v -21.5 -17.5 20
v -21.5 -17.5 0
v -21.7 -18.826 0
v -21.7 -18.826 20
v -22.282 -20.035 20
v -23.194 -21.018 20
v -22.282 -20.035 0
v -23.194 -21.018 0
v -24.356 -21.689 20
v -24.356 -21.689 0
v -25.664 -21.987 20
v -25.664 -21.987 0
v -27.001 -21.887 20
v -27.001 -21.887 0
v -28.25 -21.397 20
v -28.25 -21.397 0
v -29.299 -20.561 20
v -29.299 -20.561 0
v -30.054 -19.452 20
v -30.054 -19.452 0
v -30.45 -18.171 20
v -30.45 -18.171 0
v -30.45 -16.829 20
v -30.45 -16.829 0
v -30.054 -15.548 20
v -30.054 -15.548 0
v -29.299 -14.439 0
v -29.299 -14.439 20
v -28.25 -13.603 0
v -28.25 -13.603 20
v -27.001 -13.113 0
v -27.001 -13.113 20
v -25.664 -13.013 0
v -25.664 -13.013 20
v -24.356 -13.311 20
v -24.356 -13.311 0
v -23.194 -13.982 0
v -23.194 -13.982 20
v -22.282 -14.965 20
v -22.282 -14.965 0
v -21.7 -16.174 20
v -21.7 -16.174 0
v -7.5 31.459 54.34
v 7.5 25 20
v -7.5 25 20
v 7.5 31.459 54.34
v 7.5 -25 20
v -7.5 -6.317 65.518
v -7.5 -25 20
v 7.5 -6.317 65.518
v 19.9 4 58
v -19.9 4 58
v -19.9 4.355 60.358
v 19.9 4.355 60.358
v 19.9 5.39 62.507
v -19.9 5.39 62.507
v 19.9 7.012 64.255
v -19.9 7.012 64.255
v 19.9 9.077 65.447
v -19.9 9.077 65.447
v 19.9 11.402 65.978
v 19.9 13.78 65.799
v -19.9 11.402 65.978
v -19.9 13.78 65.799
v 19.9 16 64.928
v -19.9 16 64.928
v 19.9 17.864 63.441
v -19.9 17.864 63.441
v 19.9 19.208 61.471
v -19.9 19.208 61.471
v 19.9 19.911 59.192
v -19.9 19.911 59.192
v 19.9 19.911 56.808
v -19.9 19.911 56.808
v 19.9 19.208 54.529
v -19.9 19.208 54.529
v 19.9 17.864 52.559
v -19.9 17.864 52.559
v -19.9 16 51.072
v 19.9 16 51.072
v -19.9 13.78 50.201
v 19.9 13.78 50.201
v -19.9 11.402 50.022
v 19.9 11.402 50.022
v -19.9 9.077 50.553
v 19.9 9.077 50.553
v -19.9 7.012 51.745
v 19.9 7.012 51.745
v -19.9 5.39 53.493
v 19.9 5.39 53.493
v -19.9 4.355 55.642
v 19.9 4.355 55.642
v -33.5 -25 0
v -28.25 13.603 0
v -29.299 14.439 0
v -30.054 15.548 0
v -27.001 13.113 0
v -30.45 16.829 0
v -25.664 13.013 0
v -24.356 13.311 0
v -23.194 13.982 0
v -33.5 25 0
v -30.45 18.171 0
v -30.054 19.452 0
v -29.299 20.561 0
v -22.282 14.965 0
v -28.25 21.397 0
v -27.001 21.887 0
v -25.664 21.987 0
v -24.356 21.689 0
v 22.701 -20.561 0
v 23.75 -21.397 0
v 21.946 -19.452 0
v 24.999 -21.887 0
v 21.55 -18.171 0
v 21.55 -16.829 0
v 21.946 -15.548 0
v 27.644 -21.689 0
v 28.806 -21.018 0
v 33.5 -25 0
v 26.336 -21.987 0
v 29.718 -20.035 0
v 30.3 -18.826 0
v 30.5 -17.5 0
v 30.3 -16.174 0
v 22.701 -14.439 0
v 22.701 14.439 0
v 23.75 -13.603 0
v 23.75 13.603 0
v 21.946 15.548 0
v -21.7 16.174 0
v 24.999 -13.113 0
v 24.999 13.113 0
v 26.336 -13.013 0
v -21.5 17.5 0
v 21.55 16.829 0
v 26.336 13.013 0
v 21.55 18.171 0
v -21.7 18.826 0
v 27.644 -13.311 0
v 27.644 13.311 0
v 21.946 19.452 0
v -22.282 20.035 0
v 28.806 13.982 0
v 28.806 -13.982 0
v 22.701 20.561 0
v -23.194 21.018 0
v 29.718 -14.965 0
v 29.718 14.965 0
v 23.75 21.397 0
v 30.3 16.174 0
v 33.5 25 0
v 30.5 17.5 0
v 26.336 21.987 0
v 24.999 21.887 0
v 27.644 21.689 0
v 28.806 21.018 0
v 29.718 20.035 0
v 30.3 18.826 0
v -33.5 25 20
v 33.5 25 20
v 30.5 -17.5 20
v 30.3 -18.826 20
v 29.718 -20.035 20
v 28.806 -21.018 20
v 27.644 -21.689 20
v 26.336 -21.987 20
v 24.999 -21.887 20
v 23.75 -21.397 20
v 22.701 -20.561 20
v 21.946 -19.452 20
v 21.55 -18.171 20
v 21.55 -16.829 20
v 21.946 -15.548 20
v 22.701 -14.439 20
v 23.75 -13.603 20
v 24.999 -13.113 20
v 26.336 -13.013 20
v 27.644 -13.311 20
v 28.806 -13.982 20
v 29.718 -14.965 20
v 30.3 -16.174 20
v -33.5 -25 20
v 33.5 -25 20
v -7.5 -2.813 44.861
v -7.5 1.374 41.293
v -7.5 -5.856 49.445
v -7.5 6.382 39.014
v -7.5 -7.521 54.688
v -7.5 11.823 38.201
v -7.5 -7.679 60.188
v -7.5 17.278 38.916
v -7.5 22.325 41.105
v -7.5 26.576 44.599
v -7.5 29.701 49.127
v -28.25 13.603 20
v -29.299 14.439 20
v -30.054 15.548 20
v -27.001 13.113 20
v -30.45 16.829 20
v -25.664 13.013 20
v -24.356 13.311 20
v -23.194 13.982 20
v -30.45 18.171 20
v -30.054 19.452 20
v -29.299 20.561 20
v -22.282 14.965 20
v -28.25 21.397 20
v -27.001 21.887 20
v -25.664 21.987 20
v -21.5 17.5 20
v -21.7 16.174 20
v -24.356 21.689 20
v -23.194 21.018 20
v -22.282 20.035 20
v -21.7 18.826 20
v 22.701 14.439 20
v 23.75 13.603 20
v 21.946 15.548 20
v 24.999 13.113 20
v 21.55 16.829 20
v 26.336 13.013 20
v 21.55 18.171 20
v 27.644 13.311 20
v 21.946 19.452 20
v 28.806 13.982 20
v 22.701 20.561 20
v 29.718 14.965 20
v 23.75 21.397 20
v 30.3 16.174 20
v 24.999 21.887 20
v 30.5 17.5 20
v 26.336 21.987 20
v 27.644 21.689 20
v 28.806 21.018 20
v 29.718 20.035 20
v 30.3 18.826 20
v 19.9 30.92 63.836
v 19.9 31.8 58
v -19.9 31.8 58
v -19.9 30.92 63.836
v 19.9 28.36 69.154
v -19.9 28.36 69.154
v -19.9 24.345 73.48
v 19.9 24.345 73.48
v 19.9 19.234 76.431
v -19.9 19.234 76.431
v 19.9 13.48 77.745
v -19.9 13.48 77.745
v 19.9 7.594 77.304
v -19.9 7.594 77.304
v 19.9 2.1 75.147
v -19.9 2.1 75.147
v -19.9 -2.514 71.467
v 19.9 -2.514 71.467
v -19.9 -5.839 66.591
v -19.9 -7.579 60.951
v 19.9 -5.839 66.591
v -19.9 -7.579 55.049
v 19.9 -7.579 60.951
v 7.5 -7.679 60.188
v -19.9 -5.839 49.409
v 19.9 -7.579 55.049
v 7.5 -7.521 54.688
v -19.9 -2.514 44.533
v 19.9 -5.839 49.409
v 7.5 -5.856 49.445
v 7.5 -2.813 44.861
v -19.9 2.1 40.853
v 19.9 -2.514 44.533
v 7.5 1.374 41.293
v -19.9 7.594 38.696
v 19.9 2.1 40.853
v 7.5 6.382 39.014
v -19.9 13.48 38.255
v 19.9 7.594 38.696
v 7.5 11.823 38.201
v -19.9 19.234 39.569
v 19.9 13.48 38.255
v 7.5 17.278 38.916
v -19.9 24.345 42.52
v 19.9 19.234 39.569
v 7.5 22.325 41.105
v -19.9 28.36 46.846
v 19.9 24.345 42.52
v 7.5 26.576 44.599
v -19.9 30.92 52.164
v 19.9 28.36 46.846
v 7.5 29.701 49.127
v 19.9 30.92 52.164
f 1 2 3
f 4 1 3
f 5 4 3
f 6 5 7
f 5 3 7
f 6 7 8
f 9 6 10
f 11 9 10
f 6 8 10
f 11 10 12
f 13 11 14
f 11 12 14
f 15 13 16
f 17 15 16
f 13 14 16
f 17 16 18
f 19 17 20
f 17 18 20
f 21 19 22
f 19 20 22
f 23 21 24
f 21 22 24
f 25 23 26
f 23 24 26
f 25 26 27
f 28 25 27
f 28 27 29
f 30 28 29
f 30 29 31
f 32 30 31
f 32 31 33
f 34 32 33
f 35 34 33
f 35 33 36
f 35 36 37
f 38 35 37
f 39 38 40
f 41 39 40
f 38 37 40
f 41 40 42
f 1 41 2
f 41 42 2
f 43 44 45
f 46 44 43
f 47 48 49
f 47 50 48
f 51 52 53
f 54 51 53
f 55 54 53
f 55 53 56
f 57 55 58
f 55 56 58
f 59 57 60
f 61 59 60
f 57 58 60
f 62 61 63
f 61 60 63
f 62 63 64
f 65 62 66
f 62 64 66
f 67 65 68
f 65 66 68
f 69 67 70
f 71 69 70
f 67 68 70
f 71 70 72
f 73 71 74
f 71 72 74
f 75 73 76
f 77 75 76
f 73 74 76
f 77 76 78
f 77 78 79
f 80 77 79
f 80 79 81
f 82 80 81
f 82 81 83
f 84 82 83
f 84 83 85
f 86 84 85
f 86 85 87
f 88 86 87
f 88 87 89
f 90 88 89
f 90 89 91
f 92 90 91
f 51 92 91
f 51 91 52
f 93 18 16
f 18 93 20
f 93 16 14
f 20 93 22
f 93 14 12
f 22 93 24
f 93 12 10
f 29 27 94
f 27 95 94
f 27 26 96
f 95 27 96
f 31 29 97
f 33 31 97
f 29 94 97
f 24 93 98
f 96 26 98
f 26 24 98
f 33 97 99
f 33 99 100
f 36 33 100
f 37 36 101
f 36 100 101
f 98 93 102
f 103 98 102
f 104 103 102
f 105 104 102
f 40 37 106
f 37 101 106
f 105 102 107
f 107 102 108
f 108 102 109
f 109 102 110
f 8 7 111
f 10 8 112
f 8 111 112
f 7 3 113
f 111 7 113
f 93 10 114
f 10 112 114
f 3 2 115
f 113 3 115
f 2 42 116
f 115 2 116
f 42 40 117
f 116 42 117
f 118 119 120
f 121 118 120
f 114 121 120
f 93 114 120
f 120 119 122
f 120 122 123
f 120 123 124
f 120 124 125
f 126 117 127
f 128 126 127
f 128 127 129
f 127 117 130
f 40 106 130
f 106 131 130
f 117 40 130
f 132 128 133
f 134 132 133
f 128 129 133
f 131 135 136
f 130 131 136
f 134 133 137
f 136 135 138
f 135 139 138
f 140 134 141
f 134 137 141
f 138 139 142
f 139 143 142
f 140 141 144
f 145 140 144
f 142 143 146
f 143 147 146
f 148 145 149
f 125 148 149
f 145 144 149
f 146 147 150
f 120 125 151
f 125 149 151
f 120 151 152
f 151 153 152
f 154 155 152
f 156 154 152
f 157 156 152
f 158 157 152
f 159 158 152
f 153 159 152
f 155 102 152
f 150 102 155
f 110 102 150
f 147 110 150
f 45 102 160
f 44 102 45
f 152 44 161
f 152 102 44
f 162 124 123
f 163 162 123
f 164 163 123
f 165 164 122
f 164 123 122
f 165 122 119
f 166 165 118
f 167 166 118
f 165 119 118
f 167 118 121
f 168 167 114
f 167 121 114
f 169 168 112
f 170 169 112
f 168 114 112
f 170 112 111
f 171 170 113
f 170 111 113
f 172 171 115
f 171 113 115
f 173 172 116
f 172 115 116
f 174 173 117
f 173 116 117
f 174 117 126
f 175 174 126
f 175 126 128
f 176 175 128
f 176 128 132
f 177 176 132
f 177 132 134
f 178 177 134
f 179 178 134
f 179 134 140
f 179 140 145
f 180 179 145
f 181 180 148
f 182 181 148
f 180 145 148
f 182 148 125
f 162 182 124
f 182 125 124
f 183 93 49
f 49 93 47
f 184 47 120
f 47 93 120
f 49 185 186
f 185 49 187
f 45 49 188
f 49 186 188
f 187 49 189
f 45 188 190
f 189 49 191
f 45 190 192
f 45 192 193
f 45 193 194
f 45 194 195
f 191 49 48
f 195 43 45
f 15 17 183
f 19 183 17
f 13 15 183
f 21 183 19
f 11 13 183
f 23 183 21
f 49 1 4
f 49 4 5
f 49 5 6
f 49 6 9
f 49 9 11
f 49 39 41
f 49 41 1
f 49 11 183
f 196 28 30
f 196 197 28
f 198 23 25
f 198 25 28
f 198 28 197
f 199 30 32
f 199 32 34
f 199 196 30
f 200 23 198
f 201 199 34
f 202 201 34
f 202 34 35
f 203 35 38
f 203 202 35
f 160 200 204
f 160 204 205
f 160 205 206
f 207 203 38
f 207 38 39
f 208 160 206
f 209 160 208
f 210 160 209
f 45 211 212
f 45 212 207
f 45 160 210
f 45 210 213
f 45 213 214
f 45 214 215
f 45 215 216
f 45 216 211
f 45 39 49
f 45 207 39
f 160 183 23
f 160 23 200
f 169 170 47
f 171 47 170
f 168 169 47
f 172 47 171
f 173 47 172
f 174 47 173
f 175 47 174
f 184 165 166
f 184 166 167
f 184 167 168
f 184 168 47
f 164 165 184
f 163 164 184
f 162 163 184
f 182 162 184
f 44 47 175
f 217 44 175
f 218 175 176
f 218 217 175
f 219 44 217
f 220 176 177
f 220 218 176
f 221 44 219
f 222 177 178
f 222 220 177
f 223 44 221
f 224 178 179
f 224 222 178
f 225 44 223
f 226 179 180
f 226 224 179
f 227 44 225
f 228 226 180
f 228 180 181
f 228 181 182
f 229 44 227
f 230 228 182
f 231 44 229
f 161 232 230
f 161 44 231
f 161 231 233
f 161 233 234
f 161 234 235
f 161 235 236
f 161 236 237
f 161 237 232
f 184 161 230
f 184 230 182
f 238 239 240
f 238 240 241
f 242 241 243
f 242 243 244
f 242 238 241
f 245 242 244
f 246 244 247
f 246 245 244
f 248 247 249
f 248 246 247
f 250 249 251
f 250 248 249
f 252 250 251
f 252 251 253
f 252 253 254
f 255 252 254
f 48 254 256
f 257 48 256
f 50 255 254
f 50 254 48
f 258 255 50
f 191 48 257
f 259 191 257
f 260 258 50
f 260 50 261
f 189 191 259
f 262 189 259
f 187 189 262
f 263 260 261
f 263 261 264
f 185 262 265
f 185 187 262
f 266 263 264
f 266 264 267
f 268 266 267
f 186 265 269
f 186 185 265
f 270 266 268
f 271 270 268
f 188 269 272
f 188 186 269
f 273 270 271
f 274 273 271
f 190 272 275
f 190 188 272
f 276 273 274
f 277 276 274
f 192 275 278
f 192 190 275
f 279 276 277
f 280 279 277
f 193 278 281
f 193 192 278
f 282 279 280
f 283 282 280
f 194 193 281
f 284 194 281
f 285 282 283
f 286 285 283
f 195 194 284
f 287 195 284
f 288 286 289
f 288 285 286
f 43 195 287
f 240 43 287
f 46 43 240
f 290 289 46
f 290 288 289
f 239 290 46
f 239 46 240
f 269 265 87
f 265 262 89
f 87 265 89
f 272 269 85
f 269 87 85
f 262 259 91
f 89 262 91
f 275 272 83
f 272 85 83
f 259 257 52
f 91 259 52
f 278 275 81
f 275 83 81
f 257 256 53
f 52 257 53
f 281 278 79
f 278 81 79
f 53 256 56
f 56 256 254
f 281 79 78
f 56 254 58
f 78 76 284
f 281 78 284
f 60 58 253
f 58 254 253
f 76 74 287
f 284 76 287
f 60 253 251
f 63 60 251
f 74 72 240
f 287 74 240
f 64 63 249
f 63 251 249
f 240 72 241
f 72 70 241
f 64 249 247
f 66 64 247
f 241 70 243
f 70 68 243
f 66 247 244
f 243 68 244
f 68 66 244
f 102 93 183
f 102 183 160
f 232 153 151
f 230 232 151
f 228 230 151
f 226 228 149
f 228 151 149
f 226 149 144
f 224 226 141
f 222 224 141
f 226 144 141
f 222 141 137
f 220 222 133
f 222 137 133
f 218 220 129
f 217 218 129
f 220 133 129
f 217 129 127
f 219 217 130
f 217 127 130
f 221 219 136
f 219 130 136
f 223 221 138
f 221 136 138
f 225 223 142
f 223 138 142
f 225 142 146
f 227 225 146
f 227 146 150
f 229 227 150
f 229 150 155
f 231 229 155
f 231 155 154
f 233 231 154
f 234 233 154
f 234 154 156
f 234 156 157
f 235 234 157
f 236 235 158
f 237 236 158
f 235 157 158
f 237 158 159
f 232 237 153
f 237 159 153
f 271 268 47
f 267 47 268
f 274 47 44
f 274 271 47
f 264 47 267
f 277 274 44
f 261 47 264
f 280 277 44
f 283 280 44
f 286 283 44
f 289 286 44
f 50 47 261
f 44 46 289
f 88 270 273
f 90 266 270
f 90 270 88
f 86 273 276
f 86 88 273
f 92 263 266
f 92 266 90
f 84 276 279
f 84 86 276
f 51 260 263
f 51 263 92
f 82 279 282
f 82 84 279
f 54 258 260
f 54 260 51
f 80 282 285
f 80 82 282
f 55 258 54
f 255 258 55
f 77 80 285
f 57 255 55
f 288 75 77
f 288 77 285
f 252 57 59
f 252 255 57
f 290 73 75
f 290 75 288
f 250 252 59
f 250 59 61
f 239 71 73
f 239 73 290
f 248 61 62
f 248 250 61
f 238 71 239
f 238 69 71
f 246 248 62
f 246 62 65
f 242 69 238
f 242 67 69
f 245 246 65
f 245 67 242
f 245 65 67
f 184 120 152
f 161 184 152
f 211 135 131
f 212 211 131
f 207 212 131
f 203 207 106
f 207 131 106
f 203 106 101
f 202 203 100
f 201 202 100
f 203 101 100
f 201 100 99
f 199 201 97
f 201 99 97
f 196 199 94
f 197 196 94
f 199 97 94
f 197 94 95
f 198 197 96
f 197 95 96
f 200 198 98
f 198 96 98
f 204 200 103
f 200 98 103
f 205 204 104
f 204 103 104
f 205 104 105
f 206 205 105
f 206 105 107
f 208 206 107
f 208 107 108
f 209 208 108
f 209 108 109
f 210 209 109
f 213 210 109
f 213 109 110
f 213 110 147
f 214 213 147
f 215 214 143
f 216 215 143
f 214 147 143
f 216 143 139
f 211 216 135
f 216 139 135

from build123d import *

# Parameters (mm, degrees)
F0_W     = 67
F0_H     = 50
F1_DEPTH = 20
F2_R     = 19.8
F3_DEPTH = 19.9
F4_R     = 8
F5_DEPTH = 53.401
F7_DEPTH = 7.5
F8_R     = 4.5
F9_DEPTH = 20


with BuildPart() as f1:
    # F0 (on Top) → F1 (new body)
    with BuildSketch(Plane.XY):
        Rectangle(F0_W, F0_H)
    extrude(amount=F1_DEPTH)



with BuildPart() as f3:
    # F2 (on Right) → F3 (new body, symmetric)
    with BuildSketch(Plane.YZ):
        with Locations((12, 58)):
            Circle(F2_R)
    extrude(amount=F3_DEPTH, both=True)

    # F4 (on face) → F5 (cut, through all)
    with BuildSketch(Plane(origin=(-19.9, 0, 0), x_dir=(0, -1, 0), z_dir=(-1, 0, 0))):
        with Locations((-12, 58)):
            Circle(F4_R)
    extrude(amount=-F5_DEPTH, mode=Mode.SUBTRACT)


with BuildPart() as f1_1:
    add(f1.part)

    add(f3.part)  # F7 merges F3
    # F6 (on Right) → F7 (join, symmetric)
    with BuildSketch(Plane.YZ):
        with BuildLine():
            Line((-6.3171015814, 65.5182304871), (-25, 20))
            Line((-25, 20), (25, 20))
            Line((25, 20), (31.4588096153, 54.3401190789))
            ThreePointArc((31.4588096153, 54.3401190789), (6.3818670386, 39.0137791536), (-6.3171015814, 65.5182304871))
        make_face()
    extrude(amount=F7_DEPTH, both=True)

    # F8 (on face) → F9 (cut, through all)
    with BuildSketch(Plane(origin=(0, 0, 0), x_dir=(1, 0, 0), z_dir=(0, 0, -1))):
        with Locations((-26, 17.5)):
            Circle(F8_R)
        with Locations((26, 17.5)):
            Circle(F8_R)
        with Locations((26, -17.5)):
            Circle(F8_R)
        with Locations((-26, -17.5)):
            Circle(F8_R)
    extrude(amount=-F9_DEPTH, mode=Mode.SUBTRACT)


solid = f1_1.part
